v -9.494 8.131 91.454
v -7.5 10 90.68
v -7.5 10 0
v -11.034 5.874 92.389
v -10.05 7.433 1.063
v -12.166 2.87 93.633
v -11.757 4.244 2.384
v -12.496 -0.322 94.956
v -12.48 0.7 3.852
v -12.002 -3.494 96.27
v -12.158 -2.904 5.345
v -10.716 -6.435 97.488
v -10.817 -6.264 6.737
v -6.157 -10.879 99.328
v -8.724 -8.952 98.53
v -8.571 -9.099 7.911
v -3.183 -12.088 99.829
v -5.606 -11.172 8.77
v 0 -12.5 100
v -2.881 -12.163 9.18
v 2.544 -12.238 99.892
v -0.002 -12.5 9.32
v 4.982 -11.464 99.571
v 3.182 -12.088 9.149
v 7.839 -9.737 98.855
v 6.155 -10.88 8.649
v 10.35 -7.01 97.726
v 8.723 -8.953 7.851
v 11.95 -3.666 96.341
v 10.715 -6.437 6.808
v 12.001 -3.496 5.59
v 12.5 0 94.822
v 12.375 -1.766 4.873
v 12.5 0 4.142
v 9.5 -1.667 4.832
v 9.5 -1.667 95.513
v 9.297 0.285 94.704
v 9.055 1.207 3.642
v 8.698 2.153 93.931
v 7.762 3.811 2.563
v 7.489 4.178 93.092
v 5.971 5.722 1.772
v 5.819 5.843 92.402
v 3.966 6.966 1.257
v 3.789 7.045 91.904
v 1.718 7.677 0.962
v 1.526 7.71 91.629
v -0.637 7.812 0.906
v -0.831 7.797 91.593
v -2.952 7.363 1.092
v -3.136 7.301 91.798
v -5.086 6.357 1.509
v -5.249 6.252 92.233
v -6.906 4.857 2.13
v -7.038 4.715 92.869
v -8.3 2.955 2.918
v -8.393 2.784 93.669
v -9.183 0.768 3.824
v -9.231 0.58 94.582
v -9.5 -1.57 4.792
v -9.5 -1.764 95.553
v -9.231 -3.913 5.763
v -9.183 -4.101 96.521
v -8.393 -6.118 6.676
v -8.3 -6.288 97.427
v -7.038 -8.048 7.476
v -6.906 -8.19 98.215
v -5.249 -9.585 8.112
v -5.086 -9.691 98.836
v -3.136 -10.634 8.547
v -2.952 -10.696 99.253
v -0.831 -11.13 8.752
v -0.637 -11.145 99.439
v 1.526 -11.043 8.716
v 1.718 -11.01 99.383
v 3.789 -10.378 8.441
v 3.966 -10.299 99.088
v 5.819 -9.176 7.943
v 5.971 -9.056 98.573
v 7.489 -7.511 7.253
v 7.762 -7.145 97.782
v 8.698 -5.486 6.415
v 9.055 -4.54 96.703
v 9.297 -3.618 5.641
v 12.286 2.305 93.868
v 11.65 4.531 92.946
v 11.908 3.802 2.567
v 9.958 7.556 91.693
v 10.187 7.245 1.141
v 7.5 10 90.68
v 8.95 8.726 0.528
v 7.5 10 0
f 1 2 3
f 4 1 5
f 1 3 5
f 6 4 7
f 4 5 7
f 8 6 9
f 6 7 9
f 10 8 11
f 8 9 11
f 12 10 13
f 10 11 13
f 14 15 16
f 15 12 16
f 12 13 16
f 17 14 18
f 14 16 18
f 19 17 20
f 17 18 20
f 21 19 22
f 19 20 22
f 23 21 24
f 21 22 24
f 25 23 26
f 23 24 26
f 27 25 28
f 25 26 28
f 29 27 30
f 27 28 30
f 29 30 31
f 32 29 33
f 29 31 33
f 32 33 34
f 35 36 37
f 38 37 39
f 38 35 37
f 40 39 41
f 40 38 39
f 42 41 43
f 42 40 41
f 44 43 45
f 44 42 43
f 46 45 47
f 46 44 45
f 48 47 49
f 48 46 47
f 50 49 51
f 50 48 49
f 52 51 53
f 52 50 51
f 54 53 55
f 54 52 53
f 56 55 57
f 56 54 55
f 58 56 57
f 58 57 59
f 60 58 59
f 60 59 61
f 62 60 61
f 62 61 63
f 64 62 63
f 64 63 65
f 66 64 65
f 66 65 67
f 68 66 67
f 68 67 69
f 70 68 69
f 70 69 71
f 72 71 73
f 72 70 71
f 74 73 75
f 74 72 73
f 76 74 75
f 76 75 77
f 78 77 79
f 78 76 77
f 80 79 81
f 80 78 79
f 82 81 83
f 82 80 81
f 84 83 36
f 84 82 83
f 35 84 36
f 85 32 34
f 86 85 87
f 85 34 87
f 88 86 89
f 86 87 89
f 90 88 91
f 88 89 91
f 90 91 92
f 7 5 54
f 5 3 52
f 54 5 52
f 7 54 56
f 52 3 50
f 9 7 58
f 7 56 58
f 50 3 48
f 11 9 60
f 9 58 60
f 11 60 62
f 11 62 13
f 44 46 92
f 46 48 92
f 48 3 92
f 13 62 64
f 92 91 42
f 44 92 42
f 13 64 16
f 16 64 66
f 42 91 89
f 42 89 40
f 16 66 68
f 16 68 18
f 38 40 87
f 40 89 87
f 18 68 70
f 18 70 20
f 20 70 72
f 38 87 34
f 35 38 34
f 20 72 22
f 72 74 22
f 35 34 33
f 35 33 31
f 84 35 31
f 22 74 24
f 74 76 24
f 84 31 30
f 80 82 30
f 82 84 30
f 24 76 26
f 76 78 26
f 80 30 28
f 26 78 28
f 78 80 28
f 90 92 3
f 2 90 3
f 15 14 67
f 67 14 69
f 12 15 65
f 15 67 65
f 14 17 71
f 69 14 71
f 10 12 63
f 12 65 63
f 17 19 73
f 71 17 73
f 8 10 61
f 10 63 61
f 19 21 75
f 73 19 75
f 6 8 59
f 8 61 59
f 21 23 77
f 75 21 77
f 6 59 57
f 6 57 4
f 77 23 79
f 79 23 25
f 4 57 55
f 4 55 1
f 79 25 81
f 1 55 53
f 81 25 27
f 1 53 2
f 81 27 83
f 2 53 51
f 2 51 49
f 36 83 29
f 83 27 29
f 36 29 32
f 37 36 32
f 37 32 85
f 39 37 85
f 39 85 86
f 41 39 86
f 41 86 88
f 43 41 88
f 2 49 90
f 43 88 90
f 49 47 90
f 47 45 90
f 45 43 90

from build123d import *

# Parameters (mm, degrees)
F0_R          = 9.5
F1_DEPTH      = 100
F3_DEPTH      = 25
F3_DEPTH_BACK = 25


with BuildPart() as f1:
    # F0 (on Top) → F1 (new body)
    with BuildSketch(Plane.XY):
        with BuildLine():
            ThreePointArc((-7.5, 10), (-5.59017, -11.18034), (12.5, 0))
            ThreePointArc((12.5, 0), (11.18034, 5.59017), (7.5, 10))
            Line((7.5, 10), (-7.5, 10))
        make_face()
        with Locations((0, -1.666667)):
            Circle(F0_R, mode=Mode.SUBTRACT)
    extrude(amount=F1_DEPTH)


with BuildPart() as f3:
    # F2 (on Right) → F3 (new body, two sides)
    with BuildSketch(Plane.YZ) as f3_sk:
        Polygon((10, 100), (-12.5, 100), (10, 90.680195), align=None)
        Polygon((-12.5, 9.319805), (-12.5, 0), (10, 0), align=None)
    extrude(amount=F3_DEPTH)
    extrude(f3_sk.sketch, amount=-F3_DEPTH_BACK)


with BuildPart() as f1_1:
    add(f1.part)

    # F4: cut F3
    add(f3.part, mode=Mode.SUBTRACT)


solid = f1_1.part
